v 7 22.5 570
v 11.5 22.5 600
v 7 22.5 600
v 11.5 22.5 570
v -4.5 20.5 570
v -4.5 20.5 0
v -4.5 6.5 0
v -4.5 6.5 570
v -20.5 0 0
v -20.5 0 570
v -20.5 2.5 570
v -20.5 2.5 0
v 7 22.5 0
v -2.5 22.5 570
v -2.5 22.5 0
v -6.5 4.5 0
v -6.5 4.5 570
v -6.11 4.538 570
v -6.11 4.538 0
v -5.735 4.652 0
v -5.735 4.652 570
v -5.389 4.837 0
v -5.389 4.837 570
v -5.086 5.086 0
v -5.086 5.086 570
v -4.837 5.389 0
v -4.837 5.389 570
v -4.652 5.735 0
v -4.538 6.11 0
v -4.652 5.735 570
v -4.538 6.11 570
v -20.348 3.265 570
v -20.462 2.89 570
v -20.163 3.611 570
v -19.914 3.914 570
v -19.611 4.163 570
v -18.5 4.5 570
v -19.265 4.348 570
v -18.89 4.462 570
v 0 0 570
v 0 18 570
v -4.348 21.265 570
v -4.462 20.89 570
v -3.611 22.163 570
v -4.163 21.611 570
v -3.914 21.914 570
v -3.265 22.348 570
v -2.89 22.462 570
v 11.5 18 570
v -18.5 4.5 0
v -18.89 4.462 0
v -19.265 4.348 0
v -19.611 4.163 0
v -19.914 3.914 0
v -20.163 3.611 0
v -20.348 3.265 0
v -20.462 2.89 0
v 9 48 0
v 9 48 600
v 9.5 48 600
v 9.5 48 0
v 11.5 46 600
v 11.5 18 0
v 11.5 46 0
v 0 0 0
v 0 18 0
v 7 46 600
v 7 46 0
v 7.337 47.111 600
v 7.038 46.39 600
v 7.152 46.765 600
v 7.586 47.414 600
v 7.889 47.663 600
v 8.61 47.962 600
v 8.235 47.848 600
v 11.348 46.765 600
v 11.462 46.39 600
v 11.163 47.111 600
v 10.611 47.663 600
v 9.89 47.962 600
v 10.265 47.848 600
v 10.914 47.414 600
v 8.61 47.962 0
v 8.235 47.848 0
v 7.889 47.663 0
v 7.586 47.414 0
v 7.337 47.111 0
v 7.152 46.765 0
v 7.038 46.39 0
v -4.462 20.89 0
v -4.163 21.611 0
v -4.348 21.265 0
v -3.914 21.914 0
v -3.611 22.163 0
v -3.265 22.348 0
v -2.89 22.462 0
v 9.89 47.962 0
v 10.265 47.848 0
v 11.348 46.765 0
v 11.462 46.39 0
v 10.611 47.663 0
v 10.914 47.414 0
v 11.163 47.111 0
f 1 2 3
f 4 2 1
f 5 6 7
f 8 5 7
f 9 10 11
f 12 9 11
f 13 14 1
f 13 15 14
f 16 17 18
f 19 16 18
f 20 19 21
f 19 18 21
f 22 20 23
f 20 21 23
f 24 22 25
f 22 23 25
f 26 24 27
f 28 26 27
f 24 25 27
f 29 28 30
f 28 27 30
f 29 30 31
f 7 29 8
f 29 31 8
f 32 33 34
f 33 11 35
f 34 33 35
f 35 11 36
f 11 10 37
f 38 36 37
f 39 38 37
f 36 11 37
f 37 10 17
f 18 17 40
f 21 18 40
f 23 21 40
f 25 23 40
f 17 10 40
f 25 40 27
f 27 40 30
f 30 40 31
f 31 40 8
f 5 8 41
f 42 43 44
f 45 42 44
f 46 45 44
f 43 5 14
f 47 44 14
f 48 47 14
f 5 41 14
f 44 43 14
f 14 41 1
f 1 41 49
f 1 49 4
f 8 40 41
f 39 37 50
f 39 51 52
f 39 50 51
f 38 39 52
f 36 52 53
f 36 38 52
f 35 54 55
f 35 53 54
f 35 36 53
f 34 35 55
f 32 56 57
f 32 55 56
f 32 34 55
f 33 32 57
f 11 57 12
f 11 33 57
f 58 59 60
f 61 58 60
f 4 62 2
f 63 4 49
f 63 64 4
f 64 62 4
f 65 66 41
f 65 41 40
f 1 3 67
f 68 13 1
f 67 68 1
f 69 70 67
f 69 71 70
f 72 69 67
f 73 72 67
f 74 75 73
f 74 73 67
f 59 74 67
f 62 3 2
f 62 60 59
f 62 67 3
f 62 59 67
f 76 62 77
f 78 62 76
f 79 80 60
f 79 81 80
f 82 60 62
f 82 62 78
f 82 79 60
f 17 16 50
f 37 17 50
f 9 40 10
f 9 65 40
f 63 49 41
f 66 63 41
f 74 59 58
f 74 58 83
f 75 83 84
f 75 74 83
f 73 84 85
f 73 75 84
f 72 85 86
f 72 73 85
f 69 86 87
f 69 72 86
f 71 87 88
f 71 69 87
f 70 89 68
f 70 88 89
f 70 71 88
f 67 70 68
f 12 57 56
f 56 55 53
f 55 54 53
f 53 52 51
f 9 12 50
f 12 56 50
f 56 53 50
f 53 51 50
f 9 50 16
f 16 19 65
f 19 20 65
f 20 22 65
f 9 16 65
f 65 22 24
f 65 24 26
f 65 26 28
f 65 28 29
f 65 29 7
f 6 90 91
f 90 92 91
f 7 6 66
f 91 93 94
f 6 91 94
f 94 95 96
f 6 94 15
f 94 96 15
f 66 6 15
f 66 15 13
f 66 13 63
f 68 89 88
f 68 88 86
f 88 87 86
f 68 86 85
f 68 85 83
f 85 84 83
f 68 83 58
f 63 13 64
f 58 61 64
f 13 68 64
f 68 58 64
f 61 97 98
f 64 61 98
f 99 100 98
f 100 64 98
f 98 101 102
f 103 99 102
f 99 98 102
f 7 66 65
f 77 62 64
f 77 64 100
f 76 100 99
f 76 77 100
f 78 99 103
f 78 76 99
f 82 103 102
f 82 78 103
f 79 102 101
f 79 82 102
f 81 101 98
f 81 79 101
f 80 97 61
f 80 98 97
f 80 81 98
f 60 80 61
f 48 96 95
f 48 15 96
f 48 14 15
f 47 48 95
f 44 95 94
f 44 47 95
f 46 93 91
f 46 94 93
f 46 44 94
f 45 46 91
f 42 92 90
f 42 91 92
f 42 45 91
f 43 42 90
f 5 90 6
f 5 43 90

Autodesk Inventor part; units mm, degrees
sketch "Sketch1" plane through (0, 0, 0) normal (0, 0, 1) x (1, 0, 0)
  line L0 (0, 0) -> (-20.5, 0)
  line L1 (-20.5, 0) -> (-20.5, 48)
  line L2 (11.5, 18) -> (0, 18)
  line L3 (0, 18) -> (0, 0)
  line L4 (-20.5, 48) -> (11.5, 48)
  line L5 (11.5, 48) -> (11.5, 18)
  line L6 (-20.5, 0) -> (0, 0)
  line L7 (0, 0) -> (0, 3.5)
  line L8 (-20.5, 3.5) -> (-20.5, 0)
  line L9 (0, 18) -> (11.5, 18)
  line L10 (11.5, 18) -> (11.5, 21.0352)
  line L11 (-20.5, 0) -> (0, 0)
  line L12 (0, 0) -> (0, 4.5)
  line L13 (-20.5, 4.5) -> (-20.5, 0)
  line L14 (-4.5, 22.5) -> (-4.5, 4.5)
  line L15 (-4.5, 4.5) -> (-20.5, 4.5)
  line L16 (-4.5, 22.5) -> (7, 22.5)
  line L17 (7, 22.5) -> (7, 48)
  point P0 (-2.8995, 48)
  dimension "d0" = 20.5
  dimension "d1" = 48
  dimension "d9" = 30
  dimension "d10" = 32
  dimension "d11" = 11.5
  dimension "d16" = 16
  dimension "d23" = 4.5
  dimension "d24" = 4.5
  dimension "d25" = 4.5
extrude "Extrusion2" add sketch "Sketch1" along normal blind 600 contours L0 L1 L15 L14 L16 L17 L4 L5 L2 L3
ref_plane "Work Plane4" through (-4.5, 7.5, 0) normal (-1, 0, 0) x (0, 0, 1)
ref_plane "Work Plane3" through (-4.5, 7.5, 0) normal (-1, 0, 0) x (0, 0, 1)
ref_plane "Work Plane2" through (-4.5, 7.5, 0) normal (-1, 0, 0) x (0, 0, 1)
ref_plane "Work Plane1" through (-4.5, 7.5, 0) normal (-1, 0, 0) x (0, 0, 1)
sketch "Sketch7" plane through (-20.5, 0, 0) normal (-1, 0, 0) x (0, 0, 1)
  line L0 (600, 22.5) -> (600, 4.5) projected
  line L1 (0, 0) -> (600, 0) projected
  line L2 (660, 22.5) -> (0, 22.5) projected
  line L3 (600, 0) -> (570, 0)
  line L4 (570, 0) -> (570, 22.5)
  line L5 (570, 22.5) -> (600, 22.5)
  line L6 (600, 22.5) -> (600, 0)
  point P0 (660, 19.5)
  point P1 (660, 7.5)
  dimension "d71" = 30
extrude "Extrusion4" cut sketch "Sketch7" along normal mid plane 1000
fillet "Fillet4" radius 2 5 edges at (-20.5, 4.5, 285) (-4.5, 22.5, 285) (7, 48, 300) (11.5, 48, 300) (-4.5, 4.5, 285)
properties part number "gancho"
